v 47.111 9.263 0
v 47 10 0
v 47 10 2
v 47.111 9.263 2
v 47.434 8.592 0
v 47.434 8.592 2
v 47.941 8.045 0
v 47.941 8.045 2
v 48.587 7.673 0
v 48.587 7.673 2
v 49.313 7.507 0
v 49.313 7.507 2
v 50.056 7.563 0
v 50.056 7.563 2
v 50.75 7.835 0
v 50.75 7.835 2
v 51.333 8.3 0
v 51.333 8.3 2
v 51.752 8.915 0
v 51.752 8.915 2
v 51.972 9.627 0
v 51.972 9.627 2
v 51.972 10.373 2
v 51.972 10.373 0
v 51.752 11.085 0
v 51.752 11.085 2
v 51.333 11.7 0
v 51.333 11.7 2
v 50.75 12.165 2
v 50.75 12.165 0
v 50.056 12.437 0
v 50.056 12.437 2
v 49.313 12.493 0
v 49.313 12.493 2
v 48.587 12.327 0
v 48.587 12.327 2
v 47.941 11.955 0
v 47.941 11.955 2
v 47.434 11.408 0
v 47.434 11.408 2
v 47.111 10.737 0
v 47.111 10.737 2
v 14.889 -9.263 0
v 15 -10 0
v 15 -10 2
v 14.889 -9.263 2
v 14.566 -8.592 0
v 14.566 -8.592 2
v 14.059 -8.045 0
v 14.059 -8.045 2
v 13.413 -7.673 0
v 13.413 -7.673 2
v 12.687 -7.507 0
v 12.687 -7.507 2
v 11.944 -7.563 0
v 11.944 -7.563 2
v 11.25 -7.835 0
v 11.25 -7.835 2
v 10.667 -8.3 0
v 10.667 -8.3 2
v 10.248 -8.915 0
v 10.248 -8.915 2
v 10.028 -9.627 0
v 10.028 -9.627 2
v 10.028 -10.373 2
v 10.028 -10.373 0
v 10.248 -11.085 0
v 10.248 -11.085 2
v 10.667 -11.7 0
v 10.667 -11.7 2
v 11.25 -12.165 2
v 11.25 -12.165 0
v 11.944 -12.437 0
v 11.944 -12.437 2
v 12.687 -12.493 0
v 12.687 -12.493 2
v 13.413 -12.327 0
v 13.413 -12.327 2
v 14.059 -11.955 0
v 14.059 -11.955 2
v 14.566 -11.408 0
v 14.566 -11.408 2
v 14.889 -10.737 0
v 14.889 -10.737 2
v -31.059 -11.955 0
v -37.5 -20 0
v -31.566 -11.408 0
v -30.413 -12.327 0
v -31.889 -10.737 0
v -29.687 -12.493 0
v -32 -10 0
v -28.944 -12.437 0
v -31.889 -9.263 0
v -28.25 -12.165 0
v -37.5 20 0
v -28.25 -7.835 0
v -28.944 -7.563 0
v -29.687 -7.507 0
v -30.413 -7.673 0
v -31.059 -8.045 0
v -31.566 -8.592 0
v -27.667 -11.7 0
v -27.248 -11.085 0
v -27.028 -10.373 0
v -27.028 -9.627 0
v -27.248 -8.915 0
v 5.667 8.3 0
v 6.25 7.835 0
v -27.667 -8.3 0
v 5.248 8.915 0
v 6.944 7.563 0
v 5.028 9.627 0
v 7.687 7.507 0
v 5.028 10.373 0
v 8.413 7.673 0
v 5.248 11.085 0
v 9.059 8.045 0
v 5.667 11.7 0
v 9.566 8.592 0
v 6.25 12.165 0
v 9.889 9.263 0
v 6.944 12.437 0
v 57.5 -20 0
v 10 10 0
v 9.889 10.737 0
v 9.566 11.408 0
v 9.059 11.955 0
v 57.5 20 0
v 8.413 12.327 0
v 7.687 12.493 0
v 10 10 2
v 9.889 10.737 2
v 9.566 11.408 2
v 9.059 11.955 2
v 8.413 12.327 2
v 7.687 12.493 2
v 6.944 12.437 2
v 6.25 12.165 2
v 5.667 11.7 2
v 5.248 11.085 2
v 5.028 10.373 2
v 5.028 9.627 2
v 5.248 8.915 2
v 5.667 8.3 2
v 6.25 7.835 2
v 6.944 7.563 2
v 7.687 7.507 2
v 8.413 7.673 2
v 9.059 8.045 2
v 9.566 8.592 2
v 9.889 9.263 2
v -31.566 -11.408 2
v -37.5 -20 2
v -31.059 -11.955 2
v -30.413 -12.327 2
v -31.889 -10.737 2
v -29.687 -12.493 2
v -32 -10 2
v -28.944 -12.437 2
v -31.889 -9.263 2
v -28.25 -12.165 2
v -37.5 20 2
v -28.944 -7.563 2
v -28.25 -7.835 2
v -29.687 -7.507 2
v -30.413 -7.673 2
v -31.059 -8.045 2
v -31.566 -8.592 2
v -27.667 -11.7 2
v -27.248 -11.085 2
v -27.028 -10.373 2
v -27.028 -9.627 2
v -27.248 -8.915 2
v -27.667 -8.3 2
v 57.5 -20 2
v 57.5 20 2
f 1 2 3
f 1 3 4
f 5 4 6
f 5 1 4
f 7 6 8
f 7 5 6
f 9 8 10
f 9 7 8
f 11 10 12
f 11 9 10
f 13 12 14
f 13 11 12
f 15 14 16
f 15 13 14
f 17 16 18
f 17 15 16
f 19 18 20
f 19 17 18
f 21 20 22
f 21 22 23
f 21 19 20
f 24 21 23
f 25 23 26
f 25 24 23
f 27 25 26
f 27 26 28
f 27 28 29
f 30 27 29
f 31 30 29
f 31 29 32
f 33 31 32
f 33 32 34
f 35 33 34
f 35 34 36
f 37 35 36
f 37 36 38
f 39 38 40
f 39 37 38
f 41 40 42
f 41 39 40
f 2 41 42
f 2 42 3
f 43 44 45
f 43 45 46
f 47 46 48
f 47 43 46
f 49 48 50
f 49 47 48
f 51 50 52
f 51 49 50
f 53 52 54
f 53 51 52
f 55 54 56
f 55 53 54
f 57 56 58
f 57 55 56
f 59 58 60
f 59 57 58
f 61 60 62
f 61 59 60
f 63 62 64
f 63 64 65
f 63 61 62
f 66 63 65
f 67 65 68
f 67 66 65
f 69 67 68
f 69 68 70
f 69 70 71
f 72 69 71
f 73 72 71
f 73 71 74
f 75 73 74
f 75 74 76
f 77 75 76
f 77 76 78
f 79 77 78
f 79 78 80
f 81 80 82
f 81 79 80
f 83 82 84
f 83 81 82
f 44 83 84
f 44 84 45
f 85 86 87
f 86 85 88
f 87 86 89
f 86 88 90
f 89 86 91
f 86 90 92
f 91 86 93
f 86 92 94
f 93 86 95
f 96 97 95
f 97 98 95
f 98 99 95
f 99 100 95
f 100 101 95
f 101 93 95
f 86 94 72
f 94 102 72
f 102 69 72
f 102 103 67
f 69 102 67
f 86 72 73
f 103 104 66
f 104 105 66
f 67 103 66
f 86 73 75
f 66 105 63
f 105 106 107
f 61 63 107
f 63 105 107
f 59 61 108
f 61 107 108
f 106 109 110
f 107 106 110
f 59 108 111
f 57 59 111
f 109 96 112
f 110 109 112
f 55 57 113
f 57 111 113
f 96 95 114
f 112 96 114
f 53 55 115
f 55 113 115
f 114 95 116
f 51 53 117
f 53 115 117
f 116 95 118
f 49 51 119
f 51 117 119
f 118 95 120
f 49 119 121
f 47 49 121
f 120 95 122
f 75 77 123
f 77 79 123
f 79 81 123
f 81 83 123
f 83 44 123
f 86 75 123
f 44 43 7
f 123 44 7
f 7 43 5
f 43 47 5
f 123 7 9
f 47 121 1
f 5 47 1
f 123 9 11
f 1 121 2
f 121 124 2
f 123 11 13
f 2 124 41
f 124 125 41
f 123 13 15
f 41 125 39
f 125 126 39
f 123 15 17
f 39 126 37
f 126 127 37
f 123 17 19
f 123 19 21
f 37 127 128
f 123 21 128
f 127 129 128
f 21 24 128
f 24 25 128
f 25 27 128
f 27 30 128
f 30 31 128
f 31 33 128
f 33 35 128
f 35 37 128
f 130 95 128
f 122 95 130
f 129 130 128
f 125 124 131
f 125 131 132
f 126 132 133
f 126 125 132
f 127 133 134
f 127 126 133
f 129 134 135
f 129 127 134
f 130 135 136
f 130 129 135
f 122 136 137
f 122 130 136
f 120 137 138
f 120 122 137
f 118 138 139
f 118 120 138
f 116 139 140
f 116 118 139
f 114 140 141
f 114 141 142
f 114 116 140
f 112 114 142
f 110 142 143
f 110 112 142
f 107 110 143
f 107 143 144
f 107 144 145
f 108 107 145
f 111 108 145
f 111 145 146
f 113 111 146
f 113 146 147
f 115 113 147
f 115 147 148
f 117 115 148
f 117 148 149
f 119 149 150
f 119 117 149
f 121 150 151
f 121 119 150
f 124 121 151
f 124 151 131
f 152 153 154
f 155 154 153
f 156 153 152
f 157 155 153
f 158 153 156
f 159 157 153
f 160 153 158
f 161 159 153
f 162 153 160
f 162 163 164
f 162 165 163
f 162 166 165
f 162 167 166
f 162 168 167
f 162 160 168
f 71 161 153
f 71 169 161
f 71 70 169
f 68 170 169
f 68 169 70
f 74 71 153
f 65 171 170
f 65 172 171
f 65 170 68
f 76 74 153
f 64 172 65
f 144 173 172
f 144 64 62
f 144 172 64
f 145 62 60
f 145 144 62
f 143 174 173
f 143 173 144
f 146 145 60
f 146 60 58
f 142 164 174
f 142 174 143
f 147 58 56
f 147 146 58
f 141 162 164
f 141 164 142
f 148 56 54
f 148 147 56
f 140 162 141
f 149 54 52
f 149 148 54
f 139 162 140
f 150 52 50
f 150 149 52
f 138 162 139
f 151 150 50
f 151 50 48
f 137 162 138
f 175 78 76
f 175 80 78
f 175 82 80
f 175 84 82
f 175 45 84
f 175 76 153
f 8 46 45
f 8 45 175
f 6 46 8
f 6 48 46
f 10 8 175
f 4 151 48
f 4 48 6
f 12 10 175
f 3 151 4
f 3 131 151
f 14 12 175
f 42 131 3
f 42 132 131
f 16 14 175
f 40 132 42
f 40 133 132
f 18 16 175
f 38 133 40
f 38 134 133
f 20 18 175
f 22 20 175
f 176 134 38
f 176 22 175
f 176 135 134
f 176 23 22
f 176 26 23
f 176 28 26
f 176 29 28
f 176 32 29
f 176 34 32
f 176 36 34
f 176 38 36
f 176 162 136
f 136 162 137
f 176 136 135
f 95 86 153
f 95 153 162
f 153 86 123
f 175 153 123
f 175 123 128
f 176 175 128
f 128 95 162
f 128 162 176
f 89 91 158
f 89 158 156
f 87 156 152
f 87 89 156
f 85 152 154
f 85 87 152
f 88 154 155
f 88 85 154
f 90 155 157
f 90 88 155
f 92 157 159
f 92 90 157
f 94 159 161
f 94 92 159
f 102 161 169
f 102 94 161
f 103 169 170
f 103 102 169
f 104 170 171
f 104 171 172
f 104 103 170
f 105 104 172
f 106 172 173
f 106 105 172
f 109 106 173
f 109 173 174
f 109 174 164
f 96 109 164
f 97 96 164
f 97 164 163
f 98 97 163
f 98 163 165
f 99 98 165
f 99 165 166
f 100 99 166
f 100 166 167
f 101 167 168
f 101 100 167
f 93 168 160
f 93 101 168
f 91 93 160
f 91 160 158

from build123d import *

# Parameters (mm, degrees)
SKETCH_1_W      = 95
SKETCH_1_H      = 40
SKETCH_1_R      = 2.5
EXTRUDE_1_DEPTH = 2


with BuildPart() as part:
    # 草图1 → 凸台-拉伸1 (new body)
    with BuildSketch(Plane.XY):
        with Locations((10, 0)):
            Rectangle(SKETCH_1_W, SKETCH_1_H)
        with Locations((7.5, 10)):
            Circle(SKETCH_1_R, mode=Mode.SUBTRACT)
        with Locations((12.5, -10)):
            Circle(SKETCH_1_R, mode=Mode.SUBTRACT)
        with Locations(Location((-29.5, -10, 0), (0, 0, 180))):
            Circle(SKETCH_1_R, mode=Mode.SUBTRACT)
        with Locations(Location((49.5, 10, 0), (0, 0, 180))):
            Circle(SKETCH_1_R, mode=Mode.SUBTRACT)
    extrude(amount=EXTRUDE_1_DEPTH)


solid = part.part
